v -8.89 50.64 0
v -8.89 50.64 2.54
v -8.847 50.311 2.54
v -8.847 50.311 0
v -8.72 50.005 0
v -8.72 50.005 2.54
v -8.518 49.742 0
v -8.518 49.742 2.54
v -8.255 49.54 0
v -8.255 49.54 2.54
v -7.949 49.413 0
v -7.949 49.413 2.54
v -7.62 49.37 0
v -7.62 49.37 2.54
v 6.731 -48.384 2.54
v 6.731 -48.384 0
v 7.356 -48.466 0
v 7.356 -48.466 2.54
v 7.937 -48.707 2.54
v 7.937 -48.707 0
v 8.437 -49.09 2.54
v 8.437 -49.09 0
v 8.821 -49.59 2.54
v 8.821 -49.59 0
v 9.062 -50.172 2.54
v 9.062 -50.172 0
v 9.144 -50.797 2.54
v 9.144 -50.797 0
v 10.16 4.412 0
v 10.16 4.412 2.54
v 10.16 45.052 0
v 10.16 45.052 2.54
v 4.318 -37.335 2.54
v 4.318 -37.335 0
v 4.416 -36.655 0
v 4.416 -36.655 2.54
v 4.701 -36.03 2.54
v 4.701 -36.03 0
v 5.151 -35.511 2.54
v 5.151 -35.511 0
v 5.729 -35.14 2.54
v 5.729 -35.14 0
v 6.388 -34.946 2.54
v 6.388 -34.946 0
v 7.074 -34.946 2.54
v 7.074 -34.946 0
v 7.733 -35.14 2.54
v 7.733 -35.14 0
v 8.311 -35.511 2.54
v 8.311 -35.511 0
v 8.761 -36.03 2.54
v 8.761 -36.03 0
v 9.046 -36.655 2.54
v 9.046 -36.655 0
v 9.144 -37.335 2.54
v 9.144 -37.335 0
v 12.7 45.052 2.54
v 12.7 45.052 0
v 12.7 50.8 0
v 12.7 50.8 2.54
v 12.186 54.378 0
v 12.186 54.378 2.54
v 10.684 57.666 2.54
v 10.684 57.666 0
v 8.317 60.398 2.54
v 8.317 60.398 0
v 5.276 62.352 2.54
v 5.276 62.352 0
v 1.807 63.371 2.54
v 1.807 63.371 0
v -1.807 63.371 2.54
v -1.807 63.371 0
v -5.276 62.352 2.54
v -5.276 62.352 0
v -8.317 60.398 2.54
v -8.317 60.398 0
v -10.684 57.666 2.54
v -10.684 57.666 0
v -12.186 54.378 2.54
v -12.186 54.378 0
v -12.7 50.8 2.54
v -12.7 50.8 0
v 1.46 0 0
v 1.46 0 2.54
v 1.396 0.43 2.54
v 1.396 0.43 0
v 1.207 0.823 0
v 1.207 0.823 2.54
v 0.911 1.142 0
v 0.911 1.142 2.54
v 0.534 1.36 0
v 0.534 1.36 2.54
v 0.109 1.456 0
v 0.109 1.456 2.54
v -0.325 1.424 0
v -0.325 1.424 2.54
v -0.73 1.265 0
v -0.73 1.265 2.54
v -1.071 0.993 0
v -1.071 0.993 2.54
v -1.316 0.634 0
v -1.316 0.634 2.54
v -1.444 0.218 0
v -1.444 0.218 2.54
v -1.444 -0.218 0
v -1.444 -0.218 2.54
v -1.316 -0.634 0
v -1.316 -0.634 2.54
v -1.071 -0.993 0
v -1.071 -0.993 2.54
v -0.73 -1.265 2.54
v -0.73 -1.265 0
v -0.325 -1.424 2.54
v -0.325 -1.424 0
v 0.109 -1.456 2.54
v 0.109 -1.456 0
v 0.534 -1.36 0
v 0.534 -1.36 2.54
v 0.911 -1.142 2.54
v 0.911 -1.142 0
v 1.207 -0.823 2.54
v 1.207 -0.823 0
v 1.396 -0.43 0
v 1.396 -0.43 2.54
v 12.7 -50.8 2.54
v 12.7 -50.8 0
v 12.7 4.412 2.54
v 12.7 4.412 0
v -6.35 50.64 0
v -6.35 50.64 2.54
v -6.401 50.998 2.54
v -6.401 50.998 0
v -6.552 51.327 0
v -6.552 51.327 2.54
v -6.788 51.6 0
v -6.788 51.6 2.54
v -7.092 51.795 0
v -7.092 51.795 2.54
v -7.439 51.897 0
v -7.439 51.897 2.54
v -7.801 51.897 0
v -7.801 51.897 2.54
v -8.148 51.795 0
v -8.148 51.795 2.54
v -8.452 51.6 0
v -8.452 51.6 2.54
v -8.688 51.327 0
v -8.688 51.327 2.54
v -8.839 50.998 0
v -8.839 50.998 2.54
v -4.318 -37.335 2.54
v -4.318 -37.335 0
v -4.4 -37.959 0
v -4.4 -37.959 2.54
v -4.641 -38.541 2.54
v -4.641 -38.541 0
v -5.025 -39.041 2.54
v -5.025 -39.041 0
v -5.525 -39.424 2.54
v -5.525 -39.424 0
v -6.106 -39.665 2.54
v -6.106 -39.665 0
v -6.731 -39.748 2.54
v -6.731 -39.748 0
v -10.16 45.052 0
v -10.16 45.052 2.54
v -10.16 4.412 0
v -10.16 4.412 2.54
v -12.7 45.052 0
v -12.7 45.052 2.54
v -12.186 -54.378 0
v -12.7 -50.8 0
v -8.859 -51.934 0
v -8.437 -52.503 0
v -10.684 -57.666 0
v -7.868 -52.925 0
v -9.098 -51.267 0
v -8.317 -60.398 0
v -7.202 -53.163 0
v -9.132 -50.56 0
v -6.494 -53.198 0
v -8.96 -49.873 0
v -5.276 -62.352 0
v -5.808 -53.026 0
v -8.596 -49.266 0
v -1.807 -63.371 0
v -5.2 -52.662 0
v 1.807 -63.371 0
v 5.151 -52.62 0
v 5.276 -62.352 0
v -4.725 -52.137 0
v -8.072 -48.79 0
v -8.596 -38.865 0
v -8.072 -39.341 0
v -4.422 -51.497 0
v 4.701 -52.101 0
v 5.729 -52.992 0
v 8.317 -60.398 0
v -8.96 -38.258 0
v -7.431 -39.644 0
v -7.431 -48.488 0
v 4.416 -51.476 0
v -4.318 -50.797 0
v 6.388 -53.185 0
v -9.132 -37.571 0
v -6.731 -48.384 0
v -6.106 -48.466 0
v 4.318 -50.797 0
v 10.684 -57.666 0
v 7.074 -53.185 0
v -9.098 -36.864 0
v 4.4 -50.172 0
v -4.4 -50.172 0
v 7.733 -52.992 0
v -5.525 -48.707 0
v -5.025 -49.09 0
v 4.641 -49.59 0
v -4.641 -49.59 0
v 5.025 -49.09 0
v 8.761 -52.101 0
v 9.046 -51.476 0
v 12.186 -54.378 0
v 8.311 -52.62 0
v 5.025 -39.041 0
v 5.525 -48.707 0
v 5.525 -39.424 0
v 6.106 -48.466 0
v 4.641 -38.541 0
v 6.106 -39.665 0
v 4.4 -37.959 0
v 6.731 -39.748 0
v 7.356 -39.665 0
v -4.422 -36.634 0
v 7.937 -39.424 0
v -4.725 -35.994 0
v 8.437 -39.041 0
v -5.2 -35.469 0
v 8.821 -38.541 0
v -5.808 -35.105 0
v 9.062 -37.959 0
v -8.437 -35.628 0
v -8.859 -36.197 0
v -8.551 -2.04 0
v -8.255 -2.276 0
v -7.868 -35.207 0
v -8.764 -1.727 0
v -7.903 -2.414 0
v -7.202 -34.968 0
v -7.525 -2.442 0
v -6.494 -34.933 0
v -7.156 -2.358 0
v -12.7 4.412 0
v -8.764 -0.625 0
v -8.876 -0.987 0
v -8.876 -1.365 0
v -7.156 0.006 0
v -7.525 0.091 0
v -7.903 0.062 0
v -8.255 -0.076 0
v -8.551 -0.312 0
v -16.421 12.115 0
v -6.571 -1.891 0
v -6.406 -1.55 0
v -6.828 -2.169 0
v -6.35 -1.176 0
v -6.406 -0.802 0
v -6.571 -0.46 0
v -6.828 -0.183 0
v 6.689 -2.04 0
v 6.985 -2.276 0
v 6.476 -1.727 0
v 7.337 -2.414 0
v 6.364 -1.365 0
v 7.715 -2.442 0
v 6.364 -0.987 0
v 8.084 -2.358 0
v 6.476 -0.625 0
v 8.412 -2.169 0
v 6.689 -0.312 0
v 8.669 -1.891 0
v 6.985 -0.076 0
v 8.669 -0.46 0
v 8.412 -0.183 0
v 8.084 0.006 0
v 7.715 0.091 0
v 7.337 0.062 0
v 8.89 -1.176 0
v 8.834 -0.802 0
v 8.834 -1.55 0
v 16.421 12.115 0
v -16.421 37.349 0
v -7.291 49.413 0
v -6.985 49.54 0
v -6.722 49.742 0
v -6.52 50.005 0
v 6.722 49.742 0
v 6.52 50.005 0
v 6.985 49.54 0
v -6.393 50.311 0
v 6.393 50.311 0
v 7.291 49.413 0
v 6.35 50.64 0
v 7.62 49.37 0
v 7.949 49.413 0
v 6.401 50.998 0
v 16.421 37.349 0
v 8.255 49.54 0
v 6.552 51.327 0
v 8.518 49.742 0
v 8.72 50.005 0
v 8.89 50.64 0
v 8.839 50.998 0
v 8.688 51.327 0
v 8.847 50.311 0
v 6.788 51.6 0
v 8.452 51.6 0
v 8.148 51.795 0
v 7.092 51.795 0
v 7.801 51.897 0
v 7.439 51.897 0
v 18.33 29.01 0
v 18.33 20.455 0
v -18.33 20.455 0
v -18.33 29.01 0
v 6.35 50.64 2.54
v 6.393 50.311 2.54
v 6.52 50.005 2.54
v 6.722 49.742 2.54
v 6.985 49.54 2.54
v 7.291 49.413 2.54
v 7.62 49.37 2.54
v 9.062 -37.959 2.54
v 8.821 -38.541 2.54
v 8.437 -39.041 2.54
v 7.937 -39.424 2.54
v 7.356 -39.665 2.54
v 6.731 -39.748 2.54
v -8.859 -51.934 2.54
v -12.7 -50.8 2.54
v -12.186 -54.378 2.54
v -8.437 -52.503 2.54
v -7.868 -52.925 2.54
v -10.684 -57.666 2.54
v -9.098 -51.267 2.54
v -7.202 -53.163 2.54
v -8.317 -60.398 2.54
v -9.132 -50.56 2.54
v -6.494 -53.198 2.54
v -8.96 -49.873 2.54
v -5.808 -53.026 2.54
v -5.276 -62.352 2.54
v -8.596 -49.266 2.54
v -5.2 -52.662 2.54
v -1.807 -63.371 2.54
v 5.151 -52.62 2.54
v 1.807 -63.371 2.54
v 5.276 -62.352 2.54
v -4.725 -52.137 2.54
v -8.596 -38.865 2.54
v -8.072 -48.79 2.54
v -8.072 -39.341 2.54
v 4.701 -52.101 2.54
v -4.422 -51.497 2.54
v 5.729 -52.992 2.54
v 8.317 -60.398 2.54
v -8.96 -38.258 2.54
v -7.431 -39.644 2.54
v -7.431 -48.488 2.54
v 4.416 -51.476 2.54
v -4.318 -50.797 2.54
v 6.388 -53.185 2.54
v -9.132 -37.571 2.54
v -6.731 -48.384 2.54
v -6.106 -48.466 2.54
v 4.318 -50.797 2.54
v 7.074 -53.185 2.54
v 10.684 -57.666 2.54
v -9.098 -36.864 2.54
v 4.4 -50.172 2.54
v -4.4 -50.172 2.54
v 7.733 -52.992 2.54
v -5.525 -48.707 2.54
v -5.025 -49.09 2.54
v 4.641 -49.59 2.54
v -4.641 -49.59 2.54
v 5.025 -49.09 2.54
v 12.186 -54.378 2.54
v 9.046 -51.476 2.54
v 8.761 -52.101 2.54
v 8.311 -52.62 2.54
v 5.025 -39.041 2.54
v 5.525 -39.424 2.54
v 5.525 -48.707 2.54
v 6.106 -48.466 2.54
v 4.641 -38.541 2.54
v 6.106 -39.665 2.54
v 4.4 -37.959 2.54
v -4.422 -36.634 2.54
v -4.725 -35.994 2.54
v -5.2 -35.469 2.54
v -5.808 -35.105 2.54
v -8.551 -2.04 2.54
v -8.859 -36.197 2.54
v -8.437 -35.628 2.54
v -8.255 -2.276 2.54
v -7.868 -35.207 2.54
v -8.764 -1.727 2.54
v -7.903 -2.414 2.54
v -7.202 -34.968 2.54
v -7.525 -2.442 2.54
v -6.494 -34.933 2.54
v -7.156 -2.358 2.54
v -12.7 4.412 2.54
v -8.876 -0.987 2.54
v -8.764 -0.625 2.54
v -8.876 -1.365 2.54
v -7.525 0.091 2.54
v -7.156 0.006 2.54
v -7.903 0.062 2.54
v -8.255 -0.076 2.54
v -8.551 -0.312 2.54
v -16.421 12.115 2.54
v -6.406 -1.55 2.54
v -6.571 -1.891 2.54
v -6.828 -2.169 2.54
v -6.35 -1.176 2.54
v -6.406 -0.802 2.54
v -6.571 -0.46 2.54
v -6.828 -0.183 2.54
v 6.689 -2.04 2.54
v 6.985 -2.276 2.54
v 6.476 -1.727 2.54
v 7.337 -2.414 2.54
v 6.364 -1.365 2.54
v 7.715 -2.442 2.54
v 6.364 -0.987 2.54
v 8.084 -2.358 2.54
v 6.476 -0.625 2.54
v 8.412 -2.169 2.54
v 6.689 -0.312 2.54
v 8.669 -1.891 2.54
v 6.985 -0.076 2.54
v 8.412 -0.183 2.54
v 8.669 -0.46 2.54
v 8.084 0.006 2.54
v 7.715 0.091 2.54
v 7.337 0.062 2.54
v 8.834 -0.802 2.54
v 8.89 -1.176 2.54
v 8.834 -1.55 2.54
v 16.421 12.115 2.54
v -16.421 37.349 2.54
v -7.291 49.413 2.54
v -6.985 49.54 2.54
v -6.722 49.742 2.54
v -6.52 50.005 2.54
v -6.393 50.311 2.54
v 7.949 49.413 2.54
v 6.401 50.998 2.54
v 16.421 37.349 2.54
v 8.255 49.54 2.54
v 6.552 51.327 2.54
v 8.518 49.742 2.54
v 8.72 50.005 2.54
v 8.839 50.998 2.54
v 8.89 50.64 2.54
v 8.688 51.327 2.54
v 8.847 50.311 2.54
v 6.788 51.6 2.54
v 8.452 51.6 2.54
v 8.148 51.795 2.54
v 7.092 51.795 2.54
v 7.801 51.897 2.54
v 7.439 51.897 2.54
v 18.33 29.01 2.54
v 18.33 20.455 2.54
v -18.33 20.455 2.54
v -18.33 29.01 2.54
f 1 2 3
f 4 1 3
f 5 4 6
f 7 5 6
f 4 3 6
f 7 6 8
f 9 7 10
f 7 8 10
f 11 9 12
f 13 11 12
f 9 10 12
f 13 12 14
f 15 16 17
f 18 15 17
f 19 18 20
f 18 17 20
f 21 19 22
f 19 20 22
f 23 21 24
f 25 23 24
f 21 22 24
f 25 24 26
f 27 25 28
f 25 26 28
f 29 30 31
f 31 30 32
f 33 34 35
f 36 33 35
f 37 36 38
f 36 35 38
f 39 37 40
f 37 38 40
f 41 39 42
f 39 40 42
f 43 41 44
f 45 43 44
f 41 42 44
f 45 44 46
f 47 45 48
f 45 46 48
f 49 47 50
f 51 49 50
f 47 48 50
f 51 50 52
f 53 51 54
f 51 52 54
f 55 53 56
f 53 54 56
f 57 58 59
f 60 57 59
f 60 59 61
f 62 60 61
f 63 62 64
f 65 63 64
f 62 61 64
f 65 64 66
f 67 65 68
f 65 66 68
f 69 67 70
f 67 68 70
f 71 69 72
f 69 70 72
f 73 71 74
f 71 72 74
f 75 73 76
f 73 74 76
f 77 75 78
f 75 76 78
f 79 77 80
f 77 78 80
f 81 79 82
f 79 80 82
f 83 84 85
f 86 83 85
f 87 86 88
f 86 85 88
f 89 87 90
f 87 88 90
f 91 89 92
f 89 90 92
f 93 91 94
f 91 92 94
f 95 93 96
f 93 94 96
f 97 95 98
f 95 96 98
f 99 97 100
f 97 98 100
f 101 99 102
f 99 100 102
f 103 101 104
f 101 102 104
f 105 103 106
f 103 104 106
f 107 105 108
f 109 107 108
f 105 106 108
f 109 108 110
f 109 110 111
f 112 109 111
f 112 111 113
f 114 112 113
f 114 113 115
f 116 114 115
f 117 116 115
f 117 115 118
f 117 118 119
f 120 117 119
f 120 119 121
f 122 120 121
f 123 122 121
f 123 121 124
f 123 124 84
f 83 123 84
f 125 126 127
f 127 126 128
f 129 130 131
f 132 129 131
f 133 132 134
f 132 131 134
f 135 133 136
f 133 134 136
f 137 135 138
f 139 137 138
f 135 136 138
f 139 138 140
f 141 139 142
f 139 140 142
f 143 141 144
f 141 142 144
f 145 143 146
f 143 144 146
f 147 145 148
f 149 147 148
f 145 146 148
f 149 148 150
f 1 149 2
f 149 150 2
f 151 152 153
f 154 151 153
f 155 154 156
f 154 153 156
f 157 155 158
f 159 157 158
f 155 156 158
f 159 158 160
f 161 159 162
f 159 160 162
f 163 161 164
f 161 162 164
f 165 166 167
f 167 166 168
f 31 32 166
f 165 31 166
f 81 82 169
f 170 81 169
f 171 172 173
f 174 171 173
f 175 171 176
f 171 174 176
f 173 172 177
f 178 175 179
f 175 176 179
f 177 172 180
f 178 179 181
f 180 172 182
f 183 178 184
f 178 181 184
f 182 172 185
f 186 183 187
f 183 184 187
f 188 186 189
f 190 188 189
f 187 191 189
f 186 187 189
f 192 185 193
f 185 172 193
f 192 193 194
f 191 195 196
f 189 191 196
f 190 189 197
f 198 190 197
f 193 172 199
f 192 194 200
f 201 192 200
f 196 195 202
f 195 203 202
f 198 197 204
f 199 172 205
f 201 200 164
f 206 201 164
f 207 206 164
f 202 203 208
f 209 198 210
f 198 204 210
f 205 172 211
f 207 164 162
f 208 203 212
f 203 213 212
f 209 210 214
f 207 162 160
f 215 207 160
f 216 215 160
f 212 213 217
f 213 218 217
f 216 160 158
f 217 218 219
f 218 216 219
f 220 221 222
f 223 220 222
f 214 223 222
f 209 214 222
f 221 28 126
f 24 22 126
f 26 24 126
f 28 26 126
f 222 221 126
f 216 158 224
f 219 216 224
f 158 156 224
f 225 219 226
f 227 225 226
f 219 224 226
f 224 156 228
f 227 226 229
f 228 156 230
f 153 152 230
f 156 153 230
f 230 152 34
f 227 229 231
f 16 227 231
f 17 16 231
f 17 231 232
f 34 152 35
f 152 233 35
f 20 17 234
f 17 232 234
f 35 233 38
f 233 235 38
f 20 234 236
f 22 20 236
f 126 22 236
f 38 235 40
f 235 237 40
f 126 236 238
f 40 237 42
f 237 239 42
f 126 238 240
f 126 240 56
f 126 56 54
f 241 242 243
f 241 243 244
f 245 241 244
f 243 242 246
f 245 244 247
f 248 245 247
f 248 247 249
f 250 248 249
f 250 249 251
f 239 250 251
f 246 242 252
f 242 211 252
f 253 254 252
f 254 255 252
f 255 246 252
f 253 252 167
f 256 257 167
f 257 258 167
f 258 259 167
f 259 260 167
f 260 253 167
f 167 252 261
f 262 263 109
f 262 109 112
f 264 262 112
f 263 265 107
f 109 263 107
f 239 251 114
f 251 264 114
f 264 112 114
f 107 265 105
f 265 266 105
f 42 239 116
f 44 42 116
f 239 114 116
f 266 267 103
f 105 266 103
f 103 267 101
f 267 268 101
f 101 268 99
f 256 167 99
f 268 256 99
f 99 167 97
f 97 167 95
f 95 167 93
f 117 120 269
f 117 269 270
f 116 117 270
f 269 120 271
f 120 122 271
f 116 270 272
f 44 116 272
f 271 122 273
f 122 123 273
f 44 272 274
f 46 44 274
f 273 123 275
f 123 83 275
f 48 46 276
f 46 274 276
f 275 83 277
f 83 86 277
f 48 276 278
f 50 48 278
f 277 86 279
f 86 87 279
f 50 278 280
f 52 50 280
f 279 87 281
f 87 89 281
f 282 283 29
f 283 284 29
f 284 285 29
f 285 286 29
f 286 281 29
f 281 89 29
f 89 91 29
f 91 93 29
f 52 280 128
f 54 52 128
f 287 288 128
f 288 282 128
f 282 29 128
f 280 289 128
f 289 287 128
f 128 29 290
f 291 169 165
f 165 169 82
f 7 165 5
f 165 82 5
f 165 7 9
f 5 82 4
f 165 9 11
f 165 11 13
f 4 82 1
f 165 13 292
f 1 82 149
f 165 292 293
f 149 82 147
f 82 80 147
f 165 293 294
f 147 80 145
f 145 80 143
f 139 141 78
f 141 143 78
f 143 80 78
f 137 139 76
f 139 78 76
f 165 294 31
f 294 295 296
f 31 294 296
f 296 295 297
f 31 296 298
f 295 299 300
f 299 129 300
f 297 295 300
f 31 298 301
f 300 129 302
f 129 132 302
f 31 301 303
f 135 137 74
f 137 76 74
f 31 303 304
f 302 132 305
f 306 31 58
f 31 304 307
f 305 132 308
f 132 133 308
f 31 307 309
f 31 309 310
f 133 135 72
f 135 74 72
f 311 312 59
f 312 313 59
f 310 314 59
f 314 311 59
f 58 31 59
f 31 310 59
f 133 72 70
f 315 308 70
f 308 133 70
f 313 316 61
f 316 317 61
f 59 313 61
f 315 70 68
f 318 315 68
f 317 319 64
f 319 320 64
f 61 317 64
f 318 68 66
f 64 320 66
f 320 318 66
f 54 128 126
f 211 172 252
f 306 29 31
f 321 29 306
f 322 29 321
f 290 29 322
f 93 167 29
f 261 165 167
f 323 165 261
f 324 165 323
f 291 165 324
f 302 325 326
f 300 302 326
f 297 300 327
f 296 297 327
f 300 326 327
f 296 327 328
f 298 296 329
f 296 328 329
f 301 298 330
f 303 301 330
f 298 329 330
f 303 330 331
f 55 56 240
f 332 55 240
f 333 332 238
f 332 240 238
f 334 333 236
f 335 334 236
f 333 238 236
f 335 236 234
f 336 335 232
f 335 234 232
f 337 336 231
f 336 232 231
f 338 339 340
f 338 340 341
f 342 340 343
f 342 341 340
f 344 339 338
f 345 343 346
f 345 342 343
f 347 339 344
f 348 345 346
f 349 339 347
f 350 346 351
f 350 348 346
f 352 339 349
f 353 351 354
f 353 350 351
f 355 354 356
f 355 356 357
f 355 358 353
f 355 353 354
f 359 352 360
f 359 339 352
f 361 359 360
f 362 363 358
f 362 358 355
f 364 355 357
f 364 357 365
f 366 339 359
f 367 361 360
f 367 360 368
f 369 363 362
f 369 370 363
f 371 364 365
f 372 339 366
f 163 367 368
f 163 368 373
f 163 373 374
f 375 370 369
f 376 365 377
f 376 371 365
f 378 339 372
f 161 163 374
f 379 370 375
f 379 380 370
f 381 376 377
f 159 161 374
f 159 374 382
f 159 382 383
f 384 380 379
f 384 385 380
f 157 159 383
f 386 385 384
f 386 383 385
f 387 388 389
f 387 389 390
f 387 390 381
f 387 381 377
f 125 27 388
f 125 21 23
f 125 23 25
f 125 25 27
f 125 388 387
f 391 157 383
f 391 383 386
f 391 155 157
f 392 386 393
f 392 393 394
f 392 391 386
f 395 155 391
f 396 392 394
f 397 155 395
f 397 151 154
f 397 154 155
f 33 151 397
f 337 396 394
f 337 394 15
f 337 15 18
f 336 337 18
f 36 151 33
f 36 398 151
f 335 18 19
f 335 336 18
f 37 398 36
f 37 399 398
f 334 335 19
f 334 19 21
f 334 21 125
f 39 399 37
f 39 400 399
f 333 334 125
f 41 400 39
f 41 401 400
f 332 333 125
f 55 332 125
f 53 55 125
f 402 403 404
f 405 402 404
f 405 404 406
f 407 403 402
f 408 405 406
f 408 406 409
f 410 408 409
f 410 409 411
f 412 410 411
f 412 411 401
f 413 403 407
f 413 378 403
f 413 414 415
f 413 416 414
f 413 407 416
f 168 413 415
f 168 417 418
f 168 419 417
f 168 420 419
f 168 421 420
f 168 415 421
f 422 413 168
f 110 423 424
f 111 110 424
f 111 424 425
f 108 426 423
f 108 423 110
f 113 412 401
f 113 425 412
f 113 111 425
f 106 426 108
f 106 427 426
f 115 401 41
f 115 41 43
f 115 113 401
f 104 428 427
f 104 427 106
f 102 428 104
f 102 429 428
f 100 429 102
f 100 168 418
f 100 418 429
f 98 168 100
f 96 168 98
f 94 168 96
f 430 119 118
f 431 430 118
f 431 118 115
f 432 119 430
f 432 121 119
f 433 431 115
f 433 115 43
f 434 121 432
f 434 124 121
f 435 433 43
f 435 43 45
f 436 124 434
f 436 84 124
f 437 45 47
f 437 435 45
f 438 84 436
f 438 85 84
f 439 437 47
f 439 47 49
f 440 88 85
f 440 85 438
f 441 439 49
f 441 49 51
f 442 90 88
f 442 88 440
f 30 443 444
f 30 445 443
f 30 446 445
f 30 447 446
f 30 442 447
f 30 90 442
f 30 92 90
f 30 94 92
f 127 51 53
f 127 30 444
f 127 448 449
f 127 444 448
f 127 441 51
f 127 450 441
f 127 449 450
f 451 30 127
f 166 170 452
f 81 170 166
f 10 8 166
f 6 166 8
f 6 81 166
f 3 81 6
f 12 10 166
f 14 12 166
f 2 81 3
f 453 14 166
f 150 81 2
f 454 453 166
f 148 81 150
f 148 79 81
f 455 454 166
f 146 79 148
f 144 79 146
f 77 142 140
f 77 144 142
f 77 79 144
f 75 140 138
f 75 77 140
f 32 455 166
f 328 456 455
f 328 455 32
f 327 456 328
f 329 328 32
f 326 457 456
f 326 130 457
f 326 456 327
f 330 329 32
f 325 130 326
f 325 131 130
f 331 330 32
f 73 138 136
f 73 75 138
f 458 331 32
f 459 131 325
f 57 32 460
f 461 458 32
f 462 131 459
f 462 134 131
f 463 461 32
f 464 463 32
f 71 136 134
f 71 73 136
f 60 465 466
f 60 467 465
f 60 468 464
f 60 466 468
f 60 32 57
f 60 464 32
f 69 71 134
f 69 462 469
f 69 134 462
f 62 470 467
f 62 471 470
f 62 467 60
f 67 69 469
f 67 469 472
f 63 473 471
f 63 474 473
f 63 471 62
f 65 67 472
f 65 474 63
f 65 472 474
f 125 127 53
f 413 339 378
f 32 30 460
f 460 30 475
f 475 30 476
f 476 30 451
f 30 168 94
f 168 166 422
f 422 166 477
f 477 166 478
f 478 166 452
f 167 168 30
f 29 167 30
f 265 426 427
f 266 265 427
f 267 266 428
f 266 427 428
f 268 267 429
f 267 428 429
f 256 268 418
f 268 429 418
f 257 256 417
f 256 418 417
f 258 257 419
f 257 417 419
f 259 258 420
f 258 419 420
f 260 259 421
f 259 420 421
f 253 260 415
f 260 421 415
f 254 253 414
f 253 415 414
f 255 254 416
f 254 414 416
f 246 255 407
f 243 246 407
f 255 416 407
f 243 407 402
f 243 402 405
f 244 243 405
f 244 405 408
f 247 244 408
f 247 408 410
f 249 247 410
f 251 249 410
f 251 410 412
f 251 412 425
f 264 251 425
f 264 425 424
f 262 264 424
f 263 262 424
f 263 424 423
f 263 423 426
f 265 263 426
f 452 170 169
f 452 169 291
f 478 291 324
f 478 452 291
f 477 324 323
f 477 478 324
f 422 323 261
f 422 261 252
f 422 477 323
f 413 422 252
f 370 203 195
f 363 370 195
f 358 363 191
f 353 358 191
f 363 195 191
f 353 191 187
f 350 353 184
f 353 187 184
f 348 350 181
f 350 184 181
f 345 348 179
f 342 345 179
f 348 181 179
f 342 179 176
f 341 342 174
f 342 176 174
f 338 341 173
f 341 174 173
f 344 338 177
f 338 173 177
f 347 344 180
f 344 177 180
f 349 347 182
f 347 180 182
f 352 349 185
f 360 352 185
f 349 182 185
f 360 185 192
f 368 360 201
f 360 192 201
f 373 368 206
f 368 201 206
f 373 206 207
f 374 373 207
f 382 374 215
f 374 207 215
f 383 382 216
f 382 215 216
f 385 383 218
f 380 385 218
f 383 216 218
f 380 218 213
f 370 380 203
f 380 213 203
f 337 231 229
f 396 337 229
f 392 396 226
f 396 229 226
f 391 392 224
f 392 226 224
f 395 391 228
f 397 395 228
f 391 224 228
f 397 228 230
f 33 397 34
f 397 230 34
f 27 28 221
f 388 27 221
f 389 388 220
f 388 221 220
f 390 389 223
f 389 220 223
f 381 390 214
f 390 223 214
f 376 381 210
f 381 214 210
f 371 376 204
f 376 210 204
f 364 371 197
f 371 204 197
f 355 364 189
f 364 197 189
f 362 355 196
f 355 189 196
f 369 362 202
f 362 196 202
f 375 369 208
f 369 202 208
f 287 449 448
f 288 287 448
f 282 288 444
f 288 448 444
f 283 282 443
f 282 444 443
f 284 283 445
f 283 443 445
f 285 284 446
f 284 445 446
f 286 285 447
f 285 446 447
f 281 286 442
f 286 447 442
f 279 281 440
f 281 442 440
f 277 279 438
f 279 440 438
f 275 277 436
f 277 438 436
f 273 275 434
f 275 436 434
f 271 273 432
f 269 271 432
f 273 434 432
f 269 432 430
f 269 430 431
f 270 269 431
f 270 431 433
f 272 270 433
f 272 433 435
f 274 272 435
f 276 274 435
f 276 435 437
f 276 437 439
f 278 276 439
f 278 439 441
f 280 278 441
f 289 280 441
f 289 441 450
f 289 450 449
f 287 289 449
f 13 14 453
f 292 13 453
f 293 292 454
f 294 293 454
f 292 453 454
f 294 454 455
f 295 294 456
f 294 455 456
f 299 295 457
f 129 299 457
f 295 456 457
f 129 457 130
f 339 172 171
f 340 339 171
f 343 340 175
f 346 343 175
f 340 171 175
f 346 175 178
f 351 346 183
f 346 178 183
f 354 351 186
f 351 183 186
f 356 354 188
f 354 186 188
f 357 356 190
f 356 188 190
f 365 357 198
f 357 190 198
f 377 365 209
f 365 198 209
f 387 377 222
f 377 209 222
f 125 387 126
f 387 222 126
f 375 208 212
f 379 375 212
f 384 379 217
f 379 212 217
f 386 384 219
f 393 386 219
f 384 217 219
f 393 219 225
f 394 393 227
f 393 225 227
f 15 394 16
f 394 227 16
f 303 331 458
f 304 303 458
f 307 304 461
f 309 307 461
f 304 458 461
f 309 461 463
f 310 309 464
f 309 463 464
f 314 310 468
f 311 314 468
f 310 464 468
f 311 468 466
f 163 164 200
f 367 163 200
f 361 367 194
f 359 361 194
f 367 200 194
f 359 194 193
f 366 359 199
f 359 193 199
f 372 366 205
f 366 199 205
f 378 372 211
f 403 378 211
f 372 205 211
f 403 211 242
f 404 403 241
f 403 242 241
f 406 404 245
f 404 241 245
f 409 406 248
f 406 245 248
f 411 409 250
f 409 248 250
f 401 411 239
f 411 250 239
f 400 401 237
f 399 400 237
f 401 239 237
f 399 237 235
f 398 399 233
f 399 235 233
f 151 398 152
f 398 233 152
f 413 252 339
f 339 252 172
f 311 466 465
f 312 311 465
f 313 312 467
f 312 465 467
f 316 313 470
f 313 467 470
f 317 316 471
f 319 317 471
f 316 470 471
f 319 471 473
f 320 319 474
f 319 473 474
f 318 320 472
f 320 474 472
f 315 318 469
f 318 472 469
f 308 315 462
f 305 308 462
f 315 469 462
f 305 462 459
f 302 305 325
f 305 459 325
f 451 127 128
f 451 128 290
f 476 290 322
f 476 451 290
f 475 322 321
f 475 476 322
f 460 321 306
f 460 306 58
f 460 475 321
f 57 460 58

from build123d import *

# Parameters (mm, degrees)
F1_DEPTH = 2.54
F2_R     = 1.4605
F3_DEPTH = 2.541
F5_DEPTH = 2.54
F4_R     = 1.27
F6_DEPTH = 25.4


with BuildPart() as f1:
    # F0 (on Top) → F1 (new body)
    with BuildSketch(Plane.XY):
        with BuildLine():
            Line((12.7, -50.8), (12.7, 50.8))
            ThreePointArc((12.7, 50.8), (0, 63.5), (-12.7, 50.8))
            Line((-12.7, 50.8), (-12.7, -50.8))
            ThreePointArc((-12.7, -50.8), (0, -63.5), (12.7, -50.8))
        make_face()
        with BuildLine():
            Line((4.318, -50.7966617284), (-4.318, -50.7966617284))
            ThreePointArc((-4.318, -50.7966617284), (-8.437248663, -52.5029103914), (-6.731, -48.3836617284))
            Line((-6.731, -48.3836617284), (-6.731, -39.7476617284))
            ThreePointArc((-6.731, -39.7476617284), (-8.437248663, -35.6284130654), (-4.318, -37.3346617284))
            Line((-4.318, -37.3346617284), (4.318, -37.3346617284))
            ThreePointArc((4.318, -37.3346617284), (6.731, -34.9216617284), (9.144, -37.3346617284))
            ThreePointArc((9.144, -37.3346617284), (8.437248663, -39.0409103914), (6.731, -39.7476617284))
            Line((6.731, -39.7476617284), (6.731, -48.3836617284))
            ThreePointArc((6.731, -48.3836617284), (8.437248663, -49.0904130654), (9.144, -50.7966617284))
            ThreePointArc((9.144, -50.7966617284), (6.731, -53.2096617284), (4.318, -50.7966617284))
        make_face(mode=Mode.SUBTRACT)
        with BuildLine():
            ThreePointArc((-6.731, -48.3836617284), (-5.024751337, -49.0904130654), (-4.318, -50.7966617284))
            Line((-4.318, -50.7966617284), (4.318, -50.7966617284))
            ThreePointArc((4.318, -50.7966617284), (5.024751337, -49.0904130654), (6.731, -48.3836617284))
            Line((6.731, -48.3836617284), (6.731, -39.7476617284))
            ThreePointArc((6.731, -39.7476617284), (5.024751337, -39.0409103914), (4.318, -37.3346617284))
            Line((4.318, -37.3346617284), (-4.318, -37.3346617284))
            ThreePointArc((-4.318, -37.3346617284), (-5.024751337, -39.0409103914), (-6.731, -39.7476617284))
            Line((-6.731, -39.7476617284), (-6.731, -48.3836617284))
        make_face()
    extrude(amount=F1_DEPTH)

    # F2 (on face) → F3 (cut, through all)
    with BuildSketch(Plane.XY.offset(2.54)):
        Circle(F2_R)
    extrude(amount=-F3_DEPTH, mode=Mode.SUBTRACT)

    # F4 (on face) → F5 (join, through all)
    with BuildSketch(Plane.XY.offset(2.54)):
        with BuildLine():
            ThreePointArc((12.7, 4.4121561861), (18.5710130473, 24.7321561861), (12.7, 45.0521561861))
            Line((12.7, 45.0521561861), (12.7, 4.4121561861))
        make_face()
        with BuildLine():
            Line((-12.7, 4.4121561861), (-12.7, 45.0521561861))
            ThreePointArc((-12.7, 45.0521561861), (-18.5710130473, 24.7321561861), (-12.7, 4.4121561861))
        make_face()
    extrude(amount=-F5_DEPTH)

    # F4 (on face) → F6 (cut)
    with BuildSketch(Plane.XY.offset(2.54)):
        Polygon((10.16, 4.4121561861), (10.16, 45.0521561861), (7.62, 45.0521561861), (7.62, 37.1781561861), (0, 37.1781561861), (-7.62, 37.1781561861), (-7.62, 45.0521561861), (-10.16, 45.0521561861), (-10.16, 4.4121561861), align=None)
        Polygon((7.62, 37.1781561861), (7.62, 45.0521561861), (-7.62, 45.0521561861), (-7.62, 37.1781561861), (0, 37.1781561861), align=None)
        with BuildLine():
            ThreePointArc((6.35, 50.6401561861), (6.7219743879, 49.742130574), (7.62, 49.3701561861))
            Line((7.62, 49.3701561861), (7.62, 50.6401561861))
            Line((7.62, 50.6401561861), (6.35, 50.6401561861))
        make_face()
        with BuildLine():
            Line((7.62, 50.6401561861), (7.62, 49.3701561861))
            ThreePointArc((7.62, 49.3701561861), (8.5180256121, 49.742130574), (8.89, 50.6401561861))
            Line((8.89, 50.6401561861), (7.62, 50.6401561861))
        make_face()
        with BuildLine():
            Line((7.62, 50.6401561861), (8.89, 50.6401561861))
            ThreePointArc((8.89, 50.6401561861), (7.62, 51.9101561861), (6.35, 50.6401561861))
            Line((6.35, 50.6401561861), (7.62, 50.6401561861))
        make_face()
        with BuildLine():
            ThreePointArc((-8.89, 50.6401561861), (-8.5180256121, 49.742130574), (-7.62, 49.3701561861))
            Line((-7.62, 49.3701561861), (-7.62, 50.6401561861))
            Line((-7.62, 50.6401561861), (-8.89, 50.6401561861))
        make_face()
        with BuildLine():
            Line((-7.62, 50.6401561861), (-7.62, 49.3701561861))
            ThreePointArc((-7.62, 49.3701561861), (-6.7219743879, 49.742130574), (-6.35, 50.6401561861))
            Line((-6.35, 50.6401561861), (-7.62, 50.6401561861))
        make_face()
        with BuildLine():
            Line((-8.89, 50.6401561861), (-7.62, 50.6401561861))
            Line((-7.62, 50.6401561861), (-6.35, 50.6401561861))
            ThreePointArc((-6.35, 50.6401561861), (-7.62, 51.9101561861), (-8.89, 50.6401561861))
        make_face()
        with Locations((-7.62, -1.1758438139)):
            Circle(F4_R)
        with Locations((7.62, -1.1758438139)):
            Circle(F4_R)
    extrude(amount=-F6_DEPTH, mode=Mode.SUBTRACT)


solid = f1.part
